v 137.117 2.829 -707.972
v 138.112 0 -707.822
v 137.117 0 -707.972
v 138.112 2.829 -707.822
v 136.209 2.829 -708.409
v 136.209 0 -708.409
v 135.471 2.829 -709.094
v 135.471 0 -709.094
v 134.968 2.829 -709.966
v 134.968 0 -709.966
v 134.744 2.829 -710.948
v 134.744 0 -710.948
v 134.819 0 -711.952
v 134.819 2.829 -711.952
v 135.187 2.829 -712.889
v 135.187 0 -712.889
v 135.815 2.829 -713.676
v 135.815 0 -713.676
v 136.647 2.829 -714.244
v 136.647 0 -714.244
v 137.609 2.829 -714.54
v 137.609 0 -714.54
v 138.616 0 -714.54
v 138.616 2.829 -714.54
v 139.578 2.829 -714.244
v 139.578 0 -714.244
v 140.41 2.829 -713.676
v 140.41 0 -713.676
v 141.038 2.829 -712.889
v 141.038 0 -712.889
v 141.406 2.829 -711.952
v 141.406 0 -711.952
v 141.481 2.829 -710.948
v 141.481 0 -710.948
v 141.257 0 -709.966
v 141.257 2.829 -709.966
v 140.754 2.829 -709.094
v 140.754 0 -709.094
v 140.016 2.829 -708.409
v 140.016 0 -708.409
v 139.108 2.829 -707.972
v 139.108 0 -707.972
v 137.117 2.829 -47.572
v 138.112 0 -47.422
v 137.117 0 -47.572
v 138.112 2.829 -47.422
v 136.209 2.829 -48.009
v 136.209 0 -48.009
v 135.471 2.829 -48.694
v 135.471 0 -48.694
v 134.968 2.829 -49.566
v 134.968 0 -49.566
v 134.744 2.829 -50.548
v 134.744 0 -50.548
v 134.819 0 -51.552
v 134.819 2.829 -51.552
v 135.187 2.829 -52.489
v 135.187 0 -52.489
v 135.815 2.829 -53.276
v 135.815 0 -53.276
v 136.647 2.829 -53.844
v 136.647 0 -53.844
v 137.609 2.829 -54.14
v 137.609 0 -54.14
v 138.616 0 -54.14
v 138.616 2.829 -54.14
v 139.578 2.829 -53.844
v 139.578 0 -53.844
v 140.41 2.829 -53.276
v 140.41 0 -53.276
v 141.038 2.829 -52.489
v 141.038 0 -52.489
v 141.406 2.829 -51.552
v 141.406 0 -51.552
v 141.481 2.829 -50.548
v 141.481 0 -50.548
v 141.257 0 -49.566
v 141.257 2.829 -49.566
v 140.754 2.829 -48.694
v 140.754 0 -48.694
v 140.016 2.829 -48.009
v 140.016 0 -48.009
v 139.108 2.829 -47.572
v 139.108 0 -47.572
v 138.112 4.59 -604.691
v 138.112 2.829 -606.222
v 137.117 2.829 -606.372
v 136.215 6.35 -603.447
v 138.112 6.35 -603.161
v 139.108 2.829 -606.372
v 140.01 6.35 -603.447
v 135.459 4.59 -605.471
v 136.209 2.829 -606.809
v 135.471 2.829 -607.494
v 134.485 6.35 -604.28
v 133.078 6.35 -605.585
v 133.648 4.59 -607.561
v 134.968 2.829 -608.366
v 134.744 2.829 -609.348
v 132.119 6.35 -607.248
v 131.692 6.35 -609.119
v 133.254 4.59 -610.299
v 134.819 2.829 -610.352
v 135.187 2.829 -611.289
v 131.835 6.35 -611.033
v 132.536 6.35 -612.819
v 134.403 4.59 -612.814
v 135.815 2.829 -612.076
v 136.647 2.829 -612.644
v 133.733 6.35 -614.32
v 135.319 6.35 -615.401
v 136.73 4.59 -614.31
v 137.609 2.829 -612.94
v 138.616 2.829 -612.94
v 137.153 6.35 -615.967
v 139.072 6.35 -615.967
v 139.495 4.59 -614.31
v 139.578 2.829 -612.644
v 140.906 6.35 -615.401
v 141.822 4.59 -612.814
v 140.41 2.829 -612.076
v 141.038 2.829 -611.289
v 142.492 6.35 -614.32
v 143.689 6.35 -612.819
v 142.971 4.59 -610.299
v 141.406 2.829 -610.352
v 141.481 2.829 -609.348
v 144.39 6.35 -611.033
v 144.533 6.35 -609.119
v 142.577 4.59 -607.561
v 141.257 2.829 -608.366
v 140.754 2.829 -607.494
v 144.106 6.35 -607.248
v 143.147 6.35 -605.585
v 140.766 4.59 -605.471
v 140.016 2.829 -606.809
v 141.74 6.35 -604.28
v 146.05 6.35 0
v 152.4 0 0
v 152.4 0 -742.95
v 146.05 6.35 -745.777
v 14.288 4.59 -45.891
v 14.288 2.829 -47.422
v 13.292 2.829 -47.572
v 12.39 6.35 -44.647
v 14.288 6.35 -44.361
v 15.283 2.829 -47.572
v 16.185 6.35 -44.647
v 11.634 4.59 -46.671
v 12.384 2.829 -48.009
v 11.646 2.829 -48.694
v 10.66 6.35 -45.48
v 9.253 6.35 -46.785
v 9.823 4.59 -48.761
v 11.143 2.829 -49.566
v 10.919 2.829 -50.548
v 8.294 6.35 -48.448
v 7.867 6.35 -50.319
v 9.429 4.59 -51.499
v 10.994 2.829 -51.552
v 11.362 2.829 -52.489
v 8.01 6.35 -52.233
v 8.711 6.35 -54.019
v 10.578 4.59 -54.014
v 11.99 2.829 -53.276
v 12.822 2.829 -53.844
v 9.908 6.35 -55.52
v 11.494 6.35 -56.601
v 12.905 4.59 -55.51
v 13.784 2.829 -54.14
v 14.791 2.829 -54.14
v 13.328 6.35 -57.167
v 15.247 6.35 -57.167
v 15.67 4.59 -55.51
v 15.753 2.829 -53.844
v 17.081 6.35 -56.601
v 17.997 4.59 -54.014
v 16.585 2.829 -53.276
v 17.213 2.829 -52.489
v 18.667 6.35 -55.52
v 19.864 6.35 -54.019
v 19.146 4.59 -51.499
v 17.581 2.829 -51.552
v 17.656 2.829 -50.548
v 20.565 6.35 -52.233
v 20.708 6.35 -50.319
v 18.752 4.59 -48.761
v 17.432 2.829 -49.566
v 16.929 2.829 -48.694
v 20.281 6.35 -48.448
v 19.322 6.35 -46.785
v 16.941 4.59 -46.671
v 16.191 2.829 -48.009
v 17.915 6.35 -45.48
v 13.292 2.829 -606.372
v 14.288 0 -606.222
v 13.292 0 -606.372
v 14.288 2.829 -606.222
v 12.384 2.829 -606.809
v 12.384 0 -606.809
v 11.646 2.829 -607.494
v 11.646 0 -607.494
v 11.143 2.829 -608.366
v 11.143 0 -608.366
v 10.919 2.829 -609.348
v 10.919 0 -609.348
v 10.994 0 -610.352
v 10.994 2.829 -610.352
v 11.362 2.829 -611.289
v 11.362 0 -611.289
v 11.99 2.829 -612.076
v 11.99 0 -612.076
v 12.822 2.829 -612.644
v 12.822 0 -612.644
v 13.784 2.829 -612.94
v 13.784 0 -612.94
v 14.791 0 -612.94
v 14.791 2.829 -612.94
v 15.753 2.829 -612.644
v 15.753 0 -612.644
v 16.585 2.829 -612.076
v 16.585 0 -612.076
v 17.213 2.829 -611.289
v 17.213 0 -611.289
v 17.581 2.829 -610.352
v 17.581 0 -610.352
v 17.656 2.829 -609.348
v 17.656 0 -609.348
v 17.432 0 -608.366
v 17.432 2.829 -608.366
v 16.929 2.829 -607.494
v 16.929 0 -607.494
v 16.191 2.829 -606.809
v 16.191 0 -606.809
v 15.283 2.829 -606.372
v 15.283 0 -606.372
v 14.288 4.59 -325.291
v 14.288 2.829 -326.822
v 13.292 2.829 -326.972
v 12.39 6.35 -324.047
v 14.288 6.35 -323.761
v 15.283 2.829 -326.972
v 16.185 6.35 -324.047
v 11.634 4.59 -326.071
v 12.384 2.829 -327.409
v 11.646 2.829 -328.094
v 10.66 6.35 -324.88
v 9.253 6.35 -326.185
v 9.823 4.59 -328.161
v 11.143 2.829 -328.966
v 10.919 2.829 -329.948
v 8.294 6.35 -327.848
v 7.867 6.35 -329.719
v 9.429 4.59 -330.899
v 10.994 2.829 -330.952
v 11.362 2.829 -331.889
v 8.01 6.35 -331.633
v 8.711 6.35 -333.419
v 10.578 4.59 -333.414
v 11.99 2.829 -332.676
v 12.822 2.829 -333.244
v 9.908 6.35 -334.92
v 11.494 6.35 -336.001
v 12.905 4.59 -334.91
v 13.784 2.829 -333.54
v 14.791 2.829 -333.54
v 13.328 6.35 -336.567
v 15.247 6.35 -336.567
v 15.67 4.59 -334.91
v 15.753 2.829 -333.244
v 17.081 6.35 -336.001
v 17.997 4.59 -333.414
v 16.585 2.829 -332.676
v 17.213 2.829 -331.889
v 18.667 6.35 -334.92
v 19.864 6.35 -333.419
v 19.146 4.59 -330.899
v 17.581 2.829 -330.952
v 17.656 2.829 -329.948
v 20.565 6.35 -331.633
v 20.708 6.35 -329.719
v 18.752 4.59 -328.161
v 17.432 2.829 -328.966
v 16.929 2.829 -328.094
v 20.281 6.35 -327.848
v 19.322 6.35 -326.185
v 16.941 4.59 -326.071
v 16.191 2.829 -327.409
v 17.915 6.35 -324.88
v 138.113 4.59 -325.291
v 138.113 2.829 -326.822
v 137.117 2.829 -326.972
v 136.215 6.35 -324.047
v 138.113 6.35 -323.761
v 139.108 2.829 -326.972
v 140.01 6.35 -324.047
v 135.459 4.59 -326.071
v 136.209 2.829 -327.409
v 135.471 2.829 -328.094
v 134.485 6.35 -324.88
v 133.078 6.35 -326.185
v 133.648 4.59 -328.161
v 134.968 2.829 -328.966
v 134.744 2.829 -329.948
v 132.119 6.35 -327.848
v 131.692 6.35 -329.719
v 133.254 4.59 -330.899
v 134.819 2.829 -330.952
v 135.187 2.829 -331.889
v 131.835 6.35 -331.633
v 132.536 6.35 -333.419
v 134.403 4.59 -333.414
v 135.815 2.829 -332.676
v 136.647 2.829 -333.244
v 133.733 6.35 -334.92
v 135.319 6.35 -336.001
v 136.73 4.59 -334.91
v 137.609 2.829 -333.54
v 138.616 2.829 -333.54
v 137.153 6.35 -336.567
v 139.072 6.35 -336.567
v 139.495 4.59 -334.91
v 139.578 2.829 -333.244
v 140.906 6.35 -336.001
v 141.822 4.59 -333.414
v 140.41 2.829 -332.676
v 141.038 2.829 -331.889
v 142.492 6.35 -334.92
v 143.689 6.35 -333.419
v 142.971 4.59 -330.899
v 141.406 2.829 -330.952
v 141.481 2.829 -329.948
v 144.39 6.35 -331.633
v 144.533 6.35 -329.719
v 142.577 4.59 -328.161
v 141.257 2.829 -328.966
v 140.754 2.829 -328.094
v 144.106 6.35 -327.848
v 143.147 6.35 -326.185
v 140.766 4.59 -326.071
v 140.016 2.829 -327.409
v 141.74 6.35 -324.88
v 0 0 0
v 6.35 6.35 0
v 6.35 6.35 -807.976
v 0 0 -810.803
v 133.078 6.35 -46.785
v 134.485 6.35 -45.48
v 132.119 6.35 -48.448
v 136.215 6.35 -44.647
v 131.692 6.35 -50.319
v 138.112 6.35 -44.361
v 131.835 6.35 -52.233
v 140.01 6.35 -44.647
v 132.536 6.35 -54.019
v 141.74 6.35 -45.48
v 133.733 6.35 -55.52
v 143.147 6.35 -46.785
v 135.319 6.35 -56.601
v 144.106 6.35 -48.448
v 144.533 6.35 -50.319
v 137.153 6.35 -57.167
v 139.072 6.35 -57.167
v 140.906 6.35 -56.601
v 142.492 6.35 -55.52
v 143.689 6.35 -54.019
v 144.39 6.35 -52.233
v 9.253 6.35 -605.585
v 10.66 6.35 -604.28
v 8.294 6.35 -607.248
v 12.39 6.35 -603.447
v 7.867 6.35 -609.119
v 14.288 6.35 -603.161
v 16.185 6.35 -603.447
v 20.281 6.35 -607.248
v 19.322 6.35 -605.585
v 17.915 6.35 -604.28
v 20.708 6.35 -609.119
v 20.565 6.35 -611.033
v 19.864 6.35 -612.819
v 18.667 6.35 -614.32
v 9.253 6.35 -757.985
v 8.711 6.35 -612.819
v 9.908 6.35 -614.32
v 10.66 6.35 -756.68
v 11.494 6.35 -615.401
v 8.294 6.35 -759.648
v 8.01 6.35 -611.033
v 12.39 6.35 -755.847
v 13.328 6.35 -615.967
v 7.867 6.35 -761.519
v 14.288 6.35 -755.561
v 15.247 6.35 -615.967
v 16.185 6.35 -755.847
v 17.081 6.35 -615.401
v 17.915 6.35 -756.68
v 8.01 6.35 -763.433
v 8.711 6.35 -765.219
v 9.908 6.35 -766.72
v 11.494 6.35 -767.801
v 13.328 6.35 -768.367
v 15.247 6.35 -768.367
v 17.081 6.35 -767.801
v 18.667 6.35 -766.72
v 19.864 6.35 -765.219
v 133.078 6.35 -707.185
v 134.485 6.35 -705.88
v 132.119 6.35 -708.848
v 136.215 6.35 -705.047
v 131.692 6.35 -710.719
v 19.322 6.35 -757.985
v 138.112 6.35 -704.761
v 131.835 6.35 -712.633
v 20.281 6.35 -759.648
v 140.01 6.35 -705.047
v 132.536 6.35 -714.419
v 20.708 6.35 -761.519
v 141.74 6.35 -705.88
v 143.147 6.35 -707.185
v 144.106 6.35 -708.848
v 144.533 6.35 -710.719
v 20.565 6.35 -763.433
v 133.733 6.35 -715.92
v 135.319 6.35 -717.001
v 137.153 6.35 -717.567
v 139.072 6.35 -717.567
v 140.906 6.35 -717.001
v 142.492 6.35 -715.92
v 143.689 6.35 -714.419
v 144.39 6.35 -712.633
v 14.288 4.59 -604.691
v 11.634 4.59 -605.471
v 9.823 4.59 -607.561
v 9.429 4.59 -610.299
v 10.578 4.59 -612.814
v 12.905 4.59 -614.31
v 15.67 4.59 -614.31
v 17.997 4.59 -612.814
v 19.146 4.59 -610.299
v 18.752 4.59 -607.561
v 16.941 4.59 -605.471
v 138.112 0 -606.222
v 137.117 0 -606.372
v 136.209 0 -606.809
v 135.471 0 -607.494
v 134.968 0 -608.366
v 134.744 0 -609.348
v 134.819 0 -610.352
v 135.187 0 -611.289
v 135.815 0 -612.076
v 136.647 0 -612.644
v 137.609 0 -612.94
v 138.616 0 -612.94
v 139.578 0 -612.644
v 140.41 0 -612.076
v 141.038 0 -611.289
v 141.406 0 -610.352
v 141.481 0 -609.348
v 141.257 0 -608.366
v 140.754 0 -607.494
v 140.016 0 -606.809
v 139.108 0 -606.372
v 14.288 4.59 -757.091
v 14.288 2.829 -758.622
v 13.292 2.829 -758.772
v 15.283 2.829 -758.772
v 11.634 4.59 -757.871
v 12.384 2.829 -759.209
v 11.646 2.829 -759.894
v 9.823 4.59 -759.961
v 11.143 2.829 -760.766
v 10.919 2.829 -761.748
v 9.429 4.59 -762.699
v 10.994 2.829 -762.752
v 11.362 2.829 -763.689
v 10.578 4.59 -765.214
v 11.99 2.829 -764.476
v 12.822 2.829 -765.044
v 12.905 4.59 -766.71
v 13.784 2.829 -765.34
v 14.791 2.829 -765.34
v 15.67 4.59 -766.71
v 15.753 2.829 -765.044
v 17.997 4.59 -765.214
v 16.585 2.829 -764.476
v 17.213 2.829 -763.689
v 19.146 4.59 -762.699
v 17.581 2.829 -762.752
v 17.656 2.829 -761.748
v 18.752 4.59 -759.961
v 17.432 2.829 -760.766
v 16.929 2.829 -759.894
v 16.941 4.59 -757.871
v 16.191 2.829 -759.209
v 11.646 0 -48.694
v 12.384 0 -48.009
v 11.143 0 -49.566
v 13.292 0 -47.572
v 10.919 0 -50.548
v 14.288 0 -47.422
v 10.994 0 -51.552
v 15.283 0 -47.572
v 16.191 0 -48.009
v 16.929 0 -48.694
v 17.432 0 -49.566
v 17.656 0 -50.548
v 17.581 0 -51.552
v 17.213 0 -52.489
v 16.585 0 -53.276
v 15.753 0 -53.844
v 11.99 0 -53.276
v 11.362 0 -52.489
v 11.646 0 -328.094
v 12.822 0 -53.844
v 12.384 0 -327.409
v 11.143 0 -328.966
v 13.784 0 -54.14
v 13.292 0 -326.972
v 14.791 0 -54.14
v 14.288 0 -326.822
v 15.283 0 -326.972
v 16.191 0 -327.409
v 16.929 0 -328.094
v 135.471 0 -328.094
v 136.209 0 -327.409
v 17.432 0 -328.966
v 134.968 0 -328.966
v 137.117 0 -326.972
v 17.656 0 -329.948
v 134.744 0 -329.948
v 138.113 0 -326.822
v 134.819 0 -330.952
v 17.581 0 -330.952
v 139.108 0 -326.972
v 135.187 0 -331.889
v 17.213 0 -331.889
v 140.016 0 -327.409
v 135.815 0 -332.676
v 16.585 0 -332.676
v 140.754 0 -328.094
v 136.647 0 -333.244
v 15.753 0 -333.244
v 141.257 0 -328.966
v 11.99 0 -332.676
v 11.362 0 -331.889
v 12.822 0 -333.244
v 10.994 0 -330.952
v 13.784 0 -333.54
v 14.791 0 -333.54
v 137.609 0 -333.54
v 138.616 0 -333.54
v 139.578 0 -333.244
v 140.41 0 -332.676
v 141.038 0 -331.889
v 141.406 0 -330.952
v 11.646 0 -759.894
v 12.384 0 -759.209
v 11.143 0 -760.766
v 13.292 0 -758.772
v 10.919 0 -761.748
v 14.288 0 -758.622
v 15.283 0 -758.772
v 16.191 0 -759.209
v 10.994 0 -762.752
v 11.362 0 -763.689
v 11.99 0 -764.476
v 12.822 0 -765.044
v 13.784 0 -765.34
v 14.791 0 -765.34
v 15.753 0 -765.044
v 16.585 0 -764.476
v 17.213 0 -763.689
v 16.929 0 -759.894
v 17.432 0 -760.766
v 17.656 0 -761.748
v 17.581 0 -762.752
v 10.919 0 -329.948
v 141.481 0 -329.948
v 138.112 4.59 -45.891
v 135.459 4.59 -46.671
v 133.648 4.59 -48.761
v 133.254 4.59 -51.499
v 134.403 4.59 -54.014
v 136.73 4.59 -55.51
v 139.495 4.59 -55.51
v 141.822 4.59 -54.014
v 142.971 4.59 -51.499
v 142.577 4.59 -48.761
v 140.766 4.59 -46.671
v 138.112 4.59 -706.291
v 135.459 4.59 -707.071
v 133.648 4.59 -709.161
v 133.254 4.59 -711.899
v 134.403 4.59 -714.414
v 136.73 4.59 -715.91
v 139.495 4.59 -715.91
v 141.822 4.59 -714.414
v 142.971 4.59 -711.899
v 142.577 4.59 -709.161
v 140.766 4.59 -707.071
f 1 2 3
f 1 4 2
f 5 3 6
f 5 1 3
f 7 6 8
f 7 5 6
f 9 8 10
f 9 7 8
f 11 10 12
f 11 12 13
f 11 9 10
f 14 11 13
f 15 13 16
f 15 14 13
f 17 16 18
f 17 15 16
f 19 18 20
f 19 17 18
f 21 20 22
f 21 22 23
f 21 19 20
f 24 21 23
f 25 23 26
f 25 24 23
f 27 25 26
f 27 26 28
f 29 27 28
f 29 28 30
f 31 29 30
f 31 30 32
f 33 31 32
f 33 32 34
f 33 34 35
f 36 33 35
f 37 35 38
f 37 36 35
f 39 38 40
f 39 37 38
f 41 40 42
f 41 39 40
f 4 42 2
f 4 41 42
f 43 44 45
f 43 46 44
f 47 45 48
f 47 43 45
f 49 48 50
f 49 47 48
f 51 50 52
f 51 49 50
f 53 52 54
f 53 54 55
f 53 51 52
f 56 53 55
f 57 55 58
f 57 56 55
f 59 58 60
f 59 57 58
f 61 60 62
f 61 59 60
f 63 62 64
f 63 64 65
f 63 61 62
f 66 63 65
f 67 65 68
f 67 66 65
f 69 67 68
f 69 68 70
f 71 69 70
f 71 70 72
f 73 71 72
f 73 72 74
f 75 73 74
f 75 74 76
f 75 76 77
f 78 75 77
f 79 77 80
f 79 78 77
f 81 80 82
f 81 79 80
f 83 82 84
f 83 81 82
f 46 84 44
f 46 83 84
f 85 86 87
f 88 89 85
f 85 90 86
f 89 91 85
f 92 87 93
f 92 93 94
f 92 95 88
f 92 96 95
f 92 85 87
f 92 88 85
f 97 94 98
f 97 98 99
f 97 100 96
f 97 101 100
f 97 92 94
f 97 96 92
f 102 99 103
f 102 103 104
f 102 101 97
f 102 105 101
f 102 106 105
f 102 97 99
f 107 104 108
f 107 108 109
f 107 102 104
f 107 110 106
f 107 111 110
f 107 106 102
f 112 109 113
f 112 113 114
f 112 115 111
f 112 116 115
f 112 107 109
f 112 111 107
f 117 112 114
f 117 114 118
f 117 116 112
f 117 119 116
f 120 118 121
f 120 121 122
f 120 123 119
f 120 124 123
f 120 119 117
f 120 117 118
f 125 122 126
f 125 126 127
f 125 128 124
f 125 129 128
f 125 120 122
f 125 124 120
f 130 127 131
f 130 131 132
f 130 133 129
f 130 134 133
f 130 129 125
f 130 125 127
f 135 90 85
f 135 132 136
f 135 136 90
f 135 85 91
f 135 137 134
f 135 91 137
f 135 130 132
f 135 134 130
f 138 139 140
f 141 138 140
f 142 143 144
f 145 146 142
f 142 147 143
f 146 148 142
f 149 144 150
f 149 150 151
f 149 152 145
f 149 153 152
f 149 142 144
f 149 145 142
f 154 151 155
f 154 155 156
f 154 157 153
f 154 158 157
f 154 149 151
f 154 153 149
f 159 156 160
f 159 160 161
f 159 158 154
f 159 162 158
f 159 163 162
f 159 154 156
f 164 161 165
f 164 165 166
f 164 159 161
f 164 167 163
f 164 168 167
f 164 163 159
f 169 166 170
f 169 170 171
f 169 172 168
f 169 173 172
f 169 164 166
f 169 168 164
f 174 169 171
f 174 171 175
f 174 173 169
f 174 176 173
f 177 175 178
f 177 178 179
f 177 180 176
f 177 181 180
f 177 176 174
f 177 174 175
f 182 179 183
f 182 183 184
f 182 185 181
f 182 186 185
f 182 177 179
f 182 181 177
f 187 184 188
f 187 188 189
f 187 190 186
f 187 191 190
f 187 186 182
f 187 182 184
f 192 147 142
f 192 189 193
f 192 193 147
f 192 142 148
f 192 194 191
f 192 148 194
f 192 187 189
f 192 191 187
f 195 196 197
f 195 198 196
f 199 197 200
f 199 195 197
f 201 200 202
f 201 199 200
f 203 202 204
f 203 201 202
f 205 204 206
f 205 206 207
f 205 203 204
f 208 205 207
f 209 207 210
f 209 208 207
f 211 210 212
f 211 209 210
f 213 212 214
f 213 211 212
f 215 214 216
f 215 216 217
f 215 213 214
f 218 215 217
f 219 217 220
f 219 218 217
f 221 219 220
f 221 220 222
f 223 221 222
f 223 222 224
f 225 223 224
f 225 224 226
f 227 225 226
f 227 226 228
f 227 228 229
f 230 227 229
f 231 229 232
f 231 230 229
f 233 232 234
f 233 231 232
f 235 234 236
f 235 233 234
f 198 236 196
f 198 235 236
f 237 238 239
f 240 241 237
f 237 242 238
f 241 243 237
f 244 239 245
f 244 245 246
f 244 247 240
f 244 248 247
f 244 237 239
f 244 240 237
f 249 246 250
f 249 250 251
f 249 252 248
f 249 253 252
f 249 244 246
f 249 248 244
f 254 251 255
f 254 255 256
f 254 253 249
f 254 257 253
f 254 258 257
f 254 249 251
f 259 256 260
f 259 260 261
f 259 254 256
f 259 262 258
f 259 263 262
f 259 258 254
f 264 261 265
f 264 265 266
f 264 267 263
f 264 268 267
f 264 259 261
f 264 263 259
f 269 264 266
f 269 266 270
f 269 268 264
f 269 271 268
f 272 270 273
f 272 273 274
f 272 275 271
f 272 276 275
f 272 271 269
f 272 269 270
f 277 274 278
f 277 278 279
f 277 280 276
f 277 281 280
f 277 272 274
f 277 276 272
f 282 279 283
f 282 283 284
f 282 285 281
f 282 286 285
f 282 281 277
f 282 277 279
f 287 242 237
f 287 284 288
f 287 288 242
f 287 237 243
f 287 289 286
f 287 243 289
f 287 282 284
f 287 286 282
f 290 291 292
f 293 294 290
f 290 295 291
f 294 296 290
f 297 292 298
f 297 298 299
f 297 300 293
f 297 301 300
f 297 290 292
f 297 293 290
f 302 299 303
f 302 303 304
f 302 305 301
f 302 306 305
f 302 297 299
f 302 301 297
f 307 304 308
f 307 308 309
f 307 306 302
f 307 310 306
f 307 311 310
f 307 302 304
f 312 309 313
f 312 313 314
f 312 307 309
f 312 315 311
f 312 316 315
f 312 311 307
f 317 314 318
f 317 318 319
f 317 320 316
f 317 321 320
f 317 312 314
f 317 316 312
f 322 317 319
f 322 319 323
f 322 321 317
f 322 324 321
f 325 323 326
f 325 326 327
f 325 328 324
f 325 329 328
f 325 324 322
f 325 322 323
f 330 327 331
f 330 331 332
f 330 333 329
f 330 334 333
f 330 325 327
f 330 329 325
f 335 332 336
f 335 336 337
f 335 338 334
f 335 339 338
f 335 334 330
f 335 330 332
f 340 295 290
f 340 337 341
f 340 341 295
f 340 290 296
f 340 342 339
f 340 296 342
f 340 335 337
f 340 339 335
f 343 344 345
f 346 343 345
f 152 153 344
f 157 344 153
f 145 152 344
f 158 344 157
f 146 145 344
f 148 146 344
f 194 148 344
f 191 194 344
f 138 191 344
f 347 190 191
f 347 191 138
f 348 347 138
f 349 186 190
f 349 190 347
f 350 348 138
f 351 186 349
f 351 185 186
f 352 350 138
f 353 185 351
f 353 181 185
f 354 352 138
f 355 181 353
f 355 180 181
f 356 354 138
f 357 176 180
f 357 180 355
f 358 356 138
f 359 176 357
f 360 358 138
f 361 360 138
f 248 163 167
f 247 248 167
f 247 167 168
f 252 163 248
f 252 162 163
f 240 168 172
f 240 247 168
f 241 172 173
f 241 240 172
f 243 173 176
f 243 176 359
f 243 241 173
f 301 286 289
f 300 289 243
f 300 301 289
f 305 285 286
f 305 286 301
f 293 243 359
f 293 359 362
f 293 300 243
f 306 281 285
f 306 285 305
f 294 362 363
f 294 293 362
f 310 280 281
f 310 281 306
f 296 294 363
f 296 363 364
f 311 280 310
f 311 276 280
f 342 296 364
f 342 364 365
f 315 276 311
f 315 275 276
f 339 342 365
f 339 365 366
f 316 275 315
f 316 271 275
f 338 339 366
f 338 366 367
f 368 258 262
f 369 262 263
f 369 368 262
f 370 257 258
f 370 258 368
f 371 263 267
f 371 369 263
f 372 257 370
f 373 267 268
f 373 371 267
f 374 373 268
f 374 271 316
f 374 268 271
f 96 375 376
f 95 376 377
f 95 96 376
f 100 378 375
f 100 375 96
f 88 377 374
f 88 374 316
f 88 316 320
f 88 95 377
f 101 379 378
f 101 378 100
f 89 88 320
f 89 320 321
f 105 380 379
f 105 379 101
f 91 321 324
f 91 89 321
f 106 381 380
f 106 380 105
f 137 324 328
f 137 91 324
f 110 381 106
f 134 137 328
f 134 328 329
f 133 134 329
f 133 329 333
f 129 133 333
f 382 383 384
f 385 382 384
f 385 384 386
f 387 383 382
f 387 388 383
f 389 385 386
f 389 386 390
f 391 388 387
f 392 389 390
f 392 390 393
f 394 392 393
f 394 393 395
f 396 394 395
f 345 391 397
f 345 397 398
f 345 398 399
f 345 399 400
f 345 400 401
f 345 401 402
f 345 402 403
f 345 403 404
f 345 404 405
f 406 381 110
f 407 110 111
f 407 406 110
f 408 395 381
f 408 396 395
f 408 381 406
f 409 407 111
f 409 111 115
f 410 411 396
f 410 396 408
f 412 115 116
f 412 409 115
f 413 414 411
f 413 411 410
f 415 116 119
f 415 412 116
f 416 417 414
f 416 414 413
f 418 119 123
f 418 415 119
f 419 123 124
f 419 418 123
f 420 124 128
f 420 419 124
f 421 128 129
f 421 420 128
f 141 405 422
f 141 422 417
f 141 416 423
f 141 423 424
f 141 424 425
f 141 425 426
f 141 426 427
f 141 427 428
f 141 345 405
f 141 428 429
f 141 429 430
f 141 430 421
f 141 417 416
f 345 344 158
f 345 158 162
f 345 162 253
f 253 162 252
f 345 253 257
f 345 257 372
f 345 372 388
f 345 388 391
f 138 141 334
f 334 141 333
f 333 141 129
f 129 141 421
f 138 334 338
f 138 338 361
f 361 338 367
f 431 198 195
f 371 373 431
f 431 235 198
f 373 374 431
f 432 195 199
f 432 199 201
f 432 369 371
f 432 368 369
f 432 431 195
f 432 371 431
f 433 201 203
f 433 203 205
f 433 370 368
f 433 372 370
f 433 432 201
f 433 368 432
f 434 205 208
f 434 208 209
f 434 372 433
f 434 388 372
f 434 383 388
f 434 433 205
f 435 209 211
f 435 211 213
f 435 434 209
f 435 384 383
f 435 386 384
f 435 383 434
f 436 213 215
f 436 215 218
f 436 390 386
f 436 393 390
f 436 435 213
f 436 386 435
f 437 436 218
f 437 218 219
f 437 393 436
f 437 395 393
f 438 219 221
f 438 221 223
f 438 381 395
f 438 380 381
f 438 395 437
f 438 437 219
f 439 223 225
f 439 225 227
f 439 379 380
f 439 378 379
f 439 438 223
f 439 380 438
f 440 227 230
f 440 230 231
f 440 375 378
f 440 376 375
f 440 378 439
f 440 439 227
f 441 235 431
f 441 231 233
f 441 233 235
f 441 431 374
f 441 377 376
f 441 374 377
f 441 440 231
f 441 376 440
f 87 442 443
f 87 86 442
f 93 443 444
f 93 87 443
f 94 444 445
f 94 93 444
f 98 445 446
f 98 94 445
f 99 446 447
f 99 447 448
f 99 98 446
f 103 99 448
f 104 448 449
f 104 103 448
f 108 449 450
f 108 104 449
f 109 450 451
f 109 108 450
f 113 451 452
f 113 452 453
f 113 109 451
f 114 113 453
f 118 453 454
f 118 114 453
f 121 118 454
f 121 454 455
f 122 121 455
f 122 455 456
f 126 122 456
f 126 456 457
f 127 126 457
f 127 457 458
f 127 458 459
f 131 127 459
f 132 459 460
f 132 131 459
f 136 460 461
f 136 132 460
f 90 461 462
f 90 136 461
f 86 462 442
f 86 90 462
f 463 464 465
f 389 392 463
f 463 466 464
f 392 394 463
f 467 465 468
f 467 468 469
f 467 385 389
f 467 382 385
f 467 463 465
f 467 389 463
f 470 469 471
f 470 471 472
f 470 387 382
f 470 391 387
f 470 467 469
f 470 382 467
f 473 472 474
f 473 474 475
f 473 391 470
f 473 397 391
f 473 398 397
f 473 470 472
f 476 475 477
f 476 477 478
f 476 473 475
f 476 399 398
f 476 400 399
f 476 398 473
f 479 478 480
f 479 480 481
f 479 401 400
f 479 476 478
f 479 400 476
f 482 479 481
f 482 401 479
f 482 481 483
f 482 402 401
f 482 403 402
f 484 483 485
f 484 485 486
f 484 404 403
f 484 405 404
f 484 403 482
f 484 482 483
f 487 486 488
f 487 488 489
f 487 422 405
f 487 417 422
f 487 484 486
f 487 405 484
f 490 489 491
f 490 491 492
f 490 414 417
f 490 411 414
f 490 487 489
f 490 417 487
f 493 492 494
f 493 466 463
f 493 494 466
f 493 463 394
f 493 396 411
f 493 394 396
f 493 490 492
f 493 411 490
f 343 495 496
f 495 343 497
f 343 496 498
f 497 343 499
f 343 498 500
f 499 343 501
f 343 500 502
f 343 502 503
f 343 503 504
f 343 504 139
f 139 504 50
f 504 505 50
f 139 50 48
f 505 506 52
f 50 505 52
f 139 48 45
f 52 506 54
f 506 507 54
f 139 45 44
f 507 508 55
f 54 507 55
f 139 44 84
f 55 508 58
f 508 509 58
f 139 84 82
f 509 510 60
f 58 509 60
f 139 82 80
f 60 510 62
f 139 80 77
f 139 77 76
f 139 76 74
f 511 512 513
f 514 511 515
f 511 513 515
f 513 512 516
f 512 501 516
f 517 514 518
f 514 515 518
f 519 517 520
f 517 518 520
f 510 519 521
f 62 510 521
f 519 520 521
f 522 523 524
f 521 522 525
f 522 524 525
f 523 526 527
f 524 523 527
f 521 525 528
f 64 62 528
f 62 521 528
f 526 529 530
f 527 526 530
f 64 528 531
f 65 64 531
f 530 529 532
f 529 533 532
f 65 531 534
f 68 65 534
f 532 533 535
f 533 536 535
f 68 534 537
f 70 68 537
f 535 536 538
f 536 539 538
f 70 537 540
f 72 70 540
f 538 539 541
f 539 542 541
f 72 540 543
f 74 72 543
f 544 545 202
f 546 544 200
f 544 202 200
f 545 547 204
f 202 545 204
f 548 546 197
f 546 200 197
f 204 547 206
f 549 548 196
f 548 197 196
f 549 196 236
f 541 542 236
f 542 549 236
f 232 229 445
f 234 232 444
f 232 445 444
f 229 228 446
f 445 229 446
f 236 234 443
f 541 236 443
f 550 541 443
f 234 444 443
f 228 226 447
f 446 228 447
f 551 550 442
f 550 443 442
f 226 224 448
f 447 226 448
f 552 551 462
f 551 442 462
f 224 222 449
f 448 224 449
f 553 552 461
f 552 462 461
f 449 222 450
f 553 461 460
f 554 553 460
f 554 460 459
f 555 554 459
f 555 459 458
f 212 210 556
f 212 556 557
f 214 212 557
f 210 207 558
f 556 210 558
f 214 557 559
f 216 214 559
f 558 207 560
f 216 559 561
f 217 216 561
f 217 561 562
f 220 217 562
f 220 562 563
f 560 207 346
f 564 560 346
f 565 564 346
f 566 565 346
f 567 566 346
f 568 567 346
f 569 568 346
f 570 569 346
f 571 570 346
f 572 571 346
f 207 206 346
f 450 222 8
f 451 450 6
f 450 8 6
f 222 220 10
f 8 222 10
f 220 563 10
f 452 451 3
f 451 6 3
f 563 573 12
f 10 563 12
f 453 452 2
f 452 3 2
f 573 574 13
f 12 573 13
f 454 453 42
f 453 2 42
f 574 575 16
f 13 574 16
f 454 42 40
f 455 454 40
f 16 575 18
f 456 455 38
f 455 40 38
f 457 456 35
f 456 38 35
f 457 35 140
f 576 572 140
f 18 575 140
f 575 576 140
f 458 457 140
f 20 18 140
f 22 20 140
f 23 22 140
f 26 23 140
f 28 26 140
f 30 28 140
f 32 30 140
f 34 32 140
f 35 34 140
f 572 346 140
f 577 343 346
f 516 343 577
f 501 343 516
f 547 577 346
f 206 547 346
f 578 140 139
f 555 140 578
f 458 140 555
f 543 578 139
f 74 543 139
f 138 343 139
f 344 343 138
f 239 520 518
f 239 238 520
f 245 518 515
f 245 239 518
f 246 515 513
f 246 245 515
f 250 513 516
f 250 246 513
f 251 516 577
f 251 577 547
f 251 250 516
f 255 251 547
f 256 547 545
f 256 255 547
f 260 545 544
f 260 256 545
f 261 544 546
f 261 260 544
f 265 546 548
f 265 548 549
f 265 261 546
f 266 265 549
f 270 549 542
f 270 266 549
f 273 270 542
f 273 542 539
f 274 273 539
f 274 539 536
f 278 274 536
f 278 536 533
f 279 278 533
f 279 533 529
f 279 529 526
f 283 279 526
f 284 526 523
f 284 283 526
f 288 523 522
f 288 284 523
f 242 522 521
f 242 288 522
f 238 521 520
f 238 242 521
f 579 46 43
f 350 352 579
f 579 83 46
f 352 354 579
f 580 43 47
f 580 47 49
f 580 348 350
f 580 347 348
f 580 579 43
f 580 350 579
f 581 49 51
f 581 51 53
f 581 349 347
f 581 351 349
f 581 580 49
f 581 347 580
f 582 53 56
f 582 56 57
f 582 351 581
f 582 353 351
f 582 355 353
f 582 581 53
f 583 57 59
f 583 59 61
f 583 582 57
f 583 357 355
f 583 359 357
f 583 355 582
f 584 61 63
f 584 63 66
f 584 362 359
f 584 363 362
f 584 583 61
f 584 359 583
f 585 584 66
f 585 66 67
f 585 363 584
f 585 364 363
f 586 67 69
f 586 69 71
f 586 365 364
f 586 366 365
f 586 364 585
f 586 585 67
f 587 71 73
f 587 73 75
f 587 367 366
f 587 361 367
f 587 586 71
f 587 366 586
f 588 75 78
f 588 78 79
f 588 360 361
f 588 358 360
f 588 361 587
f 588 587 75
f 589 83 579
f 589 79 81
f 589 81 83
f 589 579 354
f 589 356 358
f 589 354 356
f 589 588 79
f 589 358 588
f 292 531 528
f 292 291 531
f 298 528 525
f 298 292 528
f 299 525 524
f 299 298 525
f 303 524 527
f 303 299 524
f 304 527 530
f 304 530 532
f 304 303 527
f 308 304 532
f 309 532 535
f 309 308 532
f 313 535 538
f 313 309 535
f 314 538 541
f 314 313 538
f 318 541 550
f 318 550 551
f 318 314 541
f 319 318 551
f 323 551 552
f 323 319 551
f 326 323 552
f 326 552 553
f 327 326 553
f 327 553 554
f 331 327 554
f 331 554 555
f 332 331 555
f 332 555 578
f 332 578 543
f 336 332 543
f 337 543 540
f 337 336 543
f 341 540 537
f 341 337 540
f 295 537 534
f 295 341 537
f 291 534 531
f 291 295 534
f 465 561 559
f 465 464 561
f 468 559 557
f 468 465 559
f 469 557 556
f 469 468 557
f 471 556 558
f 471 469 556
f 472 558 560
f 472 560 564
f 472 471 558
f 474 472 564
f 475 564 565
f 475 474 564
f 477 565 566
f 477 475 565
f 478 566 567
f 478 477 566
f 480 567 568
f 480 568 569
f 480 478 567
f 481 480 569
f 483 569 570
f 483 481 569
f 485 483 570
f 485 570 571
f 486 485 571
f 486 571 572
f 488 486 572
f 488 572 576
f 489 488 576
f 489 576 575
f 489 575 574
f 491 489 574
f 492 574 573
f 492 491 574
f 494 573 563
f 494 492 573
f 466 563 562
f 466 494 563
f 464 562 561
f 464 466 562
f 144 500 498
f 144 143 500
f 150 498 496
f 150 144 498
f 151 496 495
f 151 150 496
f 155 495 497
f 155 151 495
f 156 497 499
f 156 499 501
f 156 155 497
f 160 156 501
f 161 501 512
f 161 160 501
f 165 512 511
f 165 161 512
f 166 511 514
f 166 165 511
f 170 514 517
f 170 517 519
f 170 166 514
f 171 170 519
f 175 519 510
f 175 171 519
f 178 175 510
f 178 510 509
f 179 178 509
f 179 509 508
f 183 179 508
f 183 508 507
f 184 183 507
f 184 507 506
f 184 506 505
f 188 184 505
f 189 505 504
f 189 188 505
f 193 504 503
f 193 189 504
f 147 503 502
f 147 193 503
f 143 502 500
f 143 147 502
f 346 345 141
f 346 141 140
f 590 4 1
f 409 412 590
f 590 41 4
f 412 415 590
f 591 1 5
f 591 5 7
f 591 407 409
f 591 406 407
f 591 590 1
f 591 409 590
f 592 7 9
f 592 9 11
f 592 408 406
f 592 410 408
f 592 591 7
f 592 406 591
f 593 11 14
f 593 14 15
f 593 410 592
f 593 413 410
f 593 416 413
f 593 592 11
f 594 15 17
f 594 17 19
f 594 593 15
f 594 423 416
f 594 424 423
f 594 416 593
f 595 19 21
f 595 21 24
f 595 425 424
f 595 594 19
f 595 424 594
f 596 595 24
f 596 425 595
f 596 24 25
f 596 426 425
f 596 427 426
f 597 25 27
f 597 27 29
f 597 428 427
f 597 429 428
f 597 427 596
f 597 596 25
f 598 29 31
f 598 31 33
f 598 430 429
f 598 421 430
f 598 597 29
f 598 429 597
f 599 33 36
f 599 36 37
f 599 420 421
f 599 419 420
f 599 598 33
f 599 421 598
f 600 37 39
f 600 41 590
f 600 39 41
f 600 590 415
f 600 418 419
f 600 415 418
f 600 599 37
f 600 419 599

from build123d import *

# Parameters (mm, degrees)
SKETCH1_W                                     = 152.4
SKETCH1_H                                     = 1219.2
BOSS_EXTRUDE1_DEPTH                           = 6.35
CSK_FOR_1_4_FLAT_HEAD_MACHINE_SCREW1_AT_COUNT = 2
CSK_FOR_1_4_FLAT_HEAD_MACHINE_SCREW1_AT_PITCH = 123.825
CSK_FOR_1_4_FLAT_HEAD_MACHINE_SCREW1_2_COUNT  = 2
CSK_FOR_1_4_FLAT_HEAD_MACHINE_SCREW1_2_PITCH  = 305.609212271
CSK_FOR_1_4_FLAT_HEAD_MACHINE_SCREW1_3_COUNT  = 2
CSK_FOR_1_4_FLAT_HEAD_MACHINE_SCREW1_3_PITCH  = 572.354846773
CSK_FOR_1_4_FLAT_HEAD_MACHINE_SCREW1_4_COUNT  = 2
CSK_FOR_1_4_FLAT_HEAD_MACHINE_SCREW1_4_PITCH  = 847.296801968
CSK_FOR_1_4_FLAT_HEAD_MACHINE_SCREW1_5_COUNT  = 2
CSK_FOR_1_4_FLAT_HEAD_MACHINE_SCREW1_5_PITCH  = 1124.438700252
CSK_FOR_1_4_FLAT_HEAD_MACHINE_SCREW1_6_COUNT  = 2
CSK_FOR_1_4_FLAT_HEAD_MACHINE_SCREW1_6_PITCH  = 279.4
CSK_FOR_1_4_FLAT_HEAD_MACHINE_SCREW1_7_COUNT  = 2
CSK_FOR_1_4_FLAT_HEAD_MACHINE_SCREW1_7_PITCH  = 558.8
CSK_FOR_1_4_FLAT_HEAD_MACHINE_SCREW1_8_COUNT  = 2
CSK_FOR_1_4_FLAT_HEAD_MACHINE_SCREW1_8_PITCH  = 838.2
CSK_FOR_1_4_FLAT_HEAD_MACHINE_SCREW1_9_COUNT  = 2
CSK_FOR_1_4_FLAT_HEAD_MACHINE_SCREW1_9_PITCH  = 1117.6
CHAMFER1_SIZE                                 = 6.35
CUT_EXTRUDE1_DEPTH                            = 1229.704489493
CSK_FOR_1_4_FLAT_HEAD_MACHINE_SCREW2_AT_COUNT = 2
CSK_FOR_1_4_FLAT_HEAD_MACHINE_SCREW2_AT_PITCH = 133.840467068


with BuildPart() as part:
    # Sketch1 → Boss-Extrude1 (new body)
    with BuildSketch(Plane(origin=(0, 0, 0), x_dir=(1, 0, 0), z_dir=(0, 1, 0))):
        with Locations((76.2, 609.6)):
            Rectangle(SKETCH1_W, SKETCH1_H)
    extrude(amount=BOSS_EXTRUDE1_DEPTH)

    # Sketch3 → CSK for 1/4 Flat Head Machine Screw1 (revolve, cut)
    with BuildSketch(Plane(origin=(14.2875, 6.35, -1168.4), x_dir=(0, 0, 1), z_dir=(1, 0, 0))):
        Polygon((0, 0), (0, 6.35), (3.3782, 6.35), (3.3782, 3.520932584), (6.4389, 0), align=None)
    csk_for_1_4_flat_head_machine_screw1 = revolve(axis=Axis((14.2875, 12.7, -1168.4), (0, -1, 0)), mode=Mode.SUBTRACT)

    # CSK for 1/4 Flat Head Machine Screw1 at: CSK for 1/4 Flat Head Machine Screw1 ×2
    with Locations(*[(i * CSK_FOR_1_4_FLAT_HEAD_MACHINE_SCREW1_AT_PITCH, 0, 0) for i in range(1, CSK_FOR_1_4_FLAT_HEAD_MACHINE_SCREW1_AT_COUNT)]):
        add(csk_for_1_4_flat_head_machine_screw1, mode=Mode.SUBTRACT)

    # CSK for 1_4 Flat Head Machine Screw1 2: CSK for 1/4 Flat Head Machine Screw1 ×2
    with Locations(*[Vector(0.405174304399354, 0, 0.9142394560805718) * (i * CSK_FOR_1_4_FLAT_HEAD_MACHINE_SCREW1_2_PITCH) for i in range(1, CSK_FOR_1_4_FLAT_HEAD_MACHINE_SCREW1_2_COUNT)]):
        add(csk_for_1_4_flat_head_machine_screw1, mode=Mode.SUBTRACT)

    # CSK for 1_4 Flat Head Machine Screw1 3: CSK for 1/4 Flat Head Machine Screw1 ×2
    with Locations(*[Vector(0.21634306182267615, 0, 0.9763174071997232) * (i * CSK_FOR_1_4_FLAT_HEAD_MACHINE_SCREW1_3_PITCH) for i in range(1, CSK_FOR_1_4_FLAT_HEAD_MACHINE_SCREW1_3_COUNT)]):
        add(csk_for_1_4_flat_head_machine_screw1, mode=Mode.SUBTRACT)

    # CSK for 1_4 Flat Head Machine Screw1 4: CSK for 1/4 Flat Head Machine Screw1 ×2
    with Locations(*[Vector(0.1461412337594335, 0, 0.9892637362176331) * (i * CSK_FOR_1_4_FLAT_HEAD_MACHINE_SCREW1_4_PITCH) for i in range(1, CSK_FOR_1_4_FLAT_HEAD_MACHINE_SCREW1_4_COUNT)]):
        add(csk_for_1_4_flat_head_machine_screw1, mode=Mode.SUBTRACT)

    # CSK for 1_4 Flat Head Machine Screw1 5: CSK for 1/4 Flat Head Machine Screw1 ×2
    with Locations(*[Vector(0.11012160998392527, 0, 0.9939181208804618) * (i * CSK_FOR_1_4_FLAT_HEAD_MACHINE_SCREW1_5_PITCH) for i in range(1, CSK_FOR_1_4_FLAT_HEAD_MACHINE_SCREW1_5_COUNT)]):
        add(csk_for_1_4_flat_head_machine_screw1, mode=Mode.SUBTRACT)

    # CSK for 1_4 Flat Head Machine Screw1 6: CSK for 1/4 Flat Head Machine Screw1 ×2
    with Locations(*[(0, 0, i * CSK_FOR_1_4_FLAT_HEAD_MACHINE_SCREW1_6_PITCH) for i in range(1, CSK_FOR_1_4_FLAT_HEAD_MACHINE_SCREW1_6_COUNT)]):
        add(csk_for_1_4_flat_head_machine_screw1, mode=Mode.SUBTRACT)

    # CSK for 1_4 Flat Head Machine Screw1 7: CSK for 1/4 Flat Head Machine Screw1 ×2
    with Locations(*[(0, 0, i * CSK_FOR_1_4_FLAT_HEAD_MACHINE_SCREW1_7_PITCH) for i in range(1, CSK_FOR_1_4_FLAT_HEAD_MACHINE_SCREW1_7_COUNT)]):
        add(csk_for_1_4_flat_head_machine_screw1, mode=Mode.SUBTRACT)

    # CSK for 1_4 Flat Head Machine Screw1 8: CSK for 1/4 Flat Head Machine Screw1 ×2
    with Locations(*[(0, 0, i * CSK_FOR_1_4_FLAT_HEAD_MACHINE_SCREW1_8_PITCH) for i in range(1, CSK_FOR_1_4_FLAT_HEAD_MACHINE_SCREW1_8_COUNT)]):
        add(csk_for_1_4_flat_head_machine_screw1, mode=Mode.SUBTRACT)

    # CSK for 1_4 Flat Head Machine Screw1 9: CSK for 1/4 Flat Head Machine Screw1 ×2
    with Locations(*[(0, 0, i * CSK_FOR_1_4_FLAT_HEAD_MACHINE_SCREW1_9_PITCH) for i in range(1, CSK_FOR_1_4_FLAT_HEAD_MACHINE_SCREW1_9_COUNT)]):
        add(csk_for_1_4_flat_head_machine_screw1, mode=Mode.SUBTRACT)

    # Chamfer1
    chamfer1_edges = [part.edges().sort_by_distance(p)[0] for p in [
        (0, 6.35, -609.6),
        (152.4, 6.35, -609.6),
    ]]
    chamfer(chamfer1_edges, length=CHAMFER1_SIZE - 0.0001)  # a hair under: the kernel refuses the full size

    # Sketch4 → Cut-Extrude1 (cut, through all)
    with BuildSketch(Plane(origin=(0, 6.35, 0), x_dir=(1, 0, 0), z_dir=(0, 1, 0))):
        Polygon((152.4, 742.95), (0, 810.802851641), (0, 1219.2), (152.4, 1219.2), align=None)
    extrude(amount=-CUT_EXTRUDE1_DEPTH, mode=Mode.SUBTRACT)

    # Sketch6 → CSK for 1/4 Flat Head Machine Screw2 (revolve, cut)
    with BuildSketch(Plane(origin=(14.2875, 6.35, -762), x_dir=(0, 0, 1), z_dir=(1, 0, 0))):
        Polygon((0, 0), (0, 6.35), (3.3782, 6.35), (3.3782, 3.520932584), (6.4389, 0), align=None)
    csk_for_1_4_flat_head_machine_screw2 = revolve(axis=Axis((14.2875, 12.7, -762), (0, -1, 0)), mode=Mode.SUBTRACT)

    # CSK for 1/4 Flat Head Machine Screw2 at: CSK for 1/4 Flat Head Machine Screw2 ×2
    with Locations(*[Vector(0.9251686183747461, 0, 0.3795563562563057) * (i * CSK_FOR_1_4_FLAT_HEAD_MACHINE_SCREW2_AT_PITCH) for i in range(1, CSK_FOR_1_4_FLAT_HEAD_MACHINE_SCREW2_AT_COUNT)]):
        add(csk_for_1_4_flat_head_machine_screw2, mode=Mode.SUBTRACT)


solid = part.part
